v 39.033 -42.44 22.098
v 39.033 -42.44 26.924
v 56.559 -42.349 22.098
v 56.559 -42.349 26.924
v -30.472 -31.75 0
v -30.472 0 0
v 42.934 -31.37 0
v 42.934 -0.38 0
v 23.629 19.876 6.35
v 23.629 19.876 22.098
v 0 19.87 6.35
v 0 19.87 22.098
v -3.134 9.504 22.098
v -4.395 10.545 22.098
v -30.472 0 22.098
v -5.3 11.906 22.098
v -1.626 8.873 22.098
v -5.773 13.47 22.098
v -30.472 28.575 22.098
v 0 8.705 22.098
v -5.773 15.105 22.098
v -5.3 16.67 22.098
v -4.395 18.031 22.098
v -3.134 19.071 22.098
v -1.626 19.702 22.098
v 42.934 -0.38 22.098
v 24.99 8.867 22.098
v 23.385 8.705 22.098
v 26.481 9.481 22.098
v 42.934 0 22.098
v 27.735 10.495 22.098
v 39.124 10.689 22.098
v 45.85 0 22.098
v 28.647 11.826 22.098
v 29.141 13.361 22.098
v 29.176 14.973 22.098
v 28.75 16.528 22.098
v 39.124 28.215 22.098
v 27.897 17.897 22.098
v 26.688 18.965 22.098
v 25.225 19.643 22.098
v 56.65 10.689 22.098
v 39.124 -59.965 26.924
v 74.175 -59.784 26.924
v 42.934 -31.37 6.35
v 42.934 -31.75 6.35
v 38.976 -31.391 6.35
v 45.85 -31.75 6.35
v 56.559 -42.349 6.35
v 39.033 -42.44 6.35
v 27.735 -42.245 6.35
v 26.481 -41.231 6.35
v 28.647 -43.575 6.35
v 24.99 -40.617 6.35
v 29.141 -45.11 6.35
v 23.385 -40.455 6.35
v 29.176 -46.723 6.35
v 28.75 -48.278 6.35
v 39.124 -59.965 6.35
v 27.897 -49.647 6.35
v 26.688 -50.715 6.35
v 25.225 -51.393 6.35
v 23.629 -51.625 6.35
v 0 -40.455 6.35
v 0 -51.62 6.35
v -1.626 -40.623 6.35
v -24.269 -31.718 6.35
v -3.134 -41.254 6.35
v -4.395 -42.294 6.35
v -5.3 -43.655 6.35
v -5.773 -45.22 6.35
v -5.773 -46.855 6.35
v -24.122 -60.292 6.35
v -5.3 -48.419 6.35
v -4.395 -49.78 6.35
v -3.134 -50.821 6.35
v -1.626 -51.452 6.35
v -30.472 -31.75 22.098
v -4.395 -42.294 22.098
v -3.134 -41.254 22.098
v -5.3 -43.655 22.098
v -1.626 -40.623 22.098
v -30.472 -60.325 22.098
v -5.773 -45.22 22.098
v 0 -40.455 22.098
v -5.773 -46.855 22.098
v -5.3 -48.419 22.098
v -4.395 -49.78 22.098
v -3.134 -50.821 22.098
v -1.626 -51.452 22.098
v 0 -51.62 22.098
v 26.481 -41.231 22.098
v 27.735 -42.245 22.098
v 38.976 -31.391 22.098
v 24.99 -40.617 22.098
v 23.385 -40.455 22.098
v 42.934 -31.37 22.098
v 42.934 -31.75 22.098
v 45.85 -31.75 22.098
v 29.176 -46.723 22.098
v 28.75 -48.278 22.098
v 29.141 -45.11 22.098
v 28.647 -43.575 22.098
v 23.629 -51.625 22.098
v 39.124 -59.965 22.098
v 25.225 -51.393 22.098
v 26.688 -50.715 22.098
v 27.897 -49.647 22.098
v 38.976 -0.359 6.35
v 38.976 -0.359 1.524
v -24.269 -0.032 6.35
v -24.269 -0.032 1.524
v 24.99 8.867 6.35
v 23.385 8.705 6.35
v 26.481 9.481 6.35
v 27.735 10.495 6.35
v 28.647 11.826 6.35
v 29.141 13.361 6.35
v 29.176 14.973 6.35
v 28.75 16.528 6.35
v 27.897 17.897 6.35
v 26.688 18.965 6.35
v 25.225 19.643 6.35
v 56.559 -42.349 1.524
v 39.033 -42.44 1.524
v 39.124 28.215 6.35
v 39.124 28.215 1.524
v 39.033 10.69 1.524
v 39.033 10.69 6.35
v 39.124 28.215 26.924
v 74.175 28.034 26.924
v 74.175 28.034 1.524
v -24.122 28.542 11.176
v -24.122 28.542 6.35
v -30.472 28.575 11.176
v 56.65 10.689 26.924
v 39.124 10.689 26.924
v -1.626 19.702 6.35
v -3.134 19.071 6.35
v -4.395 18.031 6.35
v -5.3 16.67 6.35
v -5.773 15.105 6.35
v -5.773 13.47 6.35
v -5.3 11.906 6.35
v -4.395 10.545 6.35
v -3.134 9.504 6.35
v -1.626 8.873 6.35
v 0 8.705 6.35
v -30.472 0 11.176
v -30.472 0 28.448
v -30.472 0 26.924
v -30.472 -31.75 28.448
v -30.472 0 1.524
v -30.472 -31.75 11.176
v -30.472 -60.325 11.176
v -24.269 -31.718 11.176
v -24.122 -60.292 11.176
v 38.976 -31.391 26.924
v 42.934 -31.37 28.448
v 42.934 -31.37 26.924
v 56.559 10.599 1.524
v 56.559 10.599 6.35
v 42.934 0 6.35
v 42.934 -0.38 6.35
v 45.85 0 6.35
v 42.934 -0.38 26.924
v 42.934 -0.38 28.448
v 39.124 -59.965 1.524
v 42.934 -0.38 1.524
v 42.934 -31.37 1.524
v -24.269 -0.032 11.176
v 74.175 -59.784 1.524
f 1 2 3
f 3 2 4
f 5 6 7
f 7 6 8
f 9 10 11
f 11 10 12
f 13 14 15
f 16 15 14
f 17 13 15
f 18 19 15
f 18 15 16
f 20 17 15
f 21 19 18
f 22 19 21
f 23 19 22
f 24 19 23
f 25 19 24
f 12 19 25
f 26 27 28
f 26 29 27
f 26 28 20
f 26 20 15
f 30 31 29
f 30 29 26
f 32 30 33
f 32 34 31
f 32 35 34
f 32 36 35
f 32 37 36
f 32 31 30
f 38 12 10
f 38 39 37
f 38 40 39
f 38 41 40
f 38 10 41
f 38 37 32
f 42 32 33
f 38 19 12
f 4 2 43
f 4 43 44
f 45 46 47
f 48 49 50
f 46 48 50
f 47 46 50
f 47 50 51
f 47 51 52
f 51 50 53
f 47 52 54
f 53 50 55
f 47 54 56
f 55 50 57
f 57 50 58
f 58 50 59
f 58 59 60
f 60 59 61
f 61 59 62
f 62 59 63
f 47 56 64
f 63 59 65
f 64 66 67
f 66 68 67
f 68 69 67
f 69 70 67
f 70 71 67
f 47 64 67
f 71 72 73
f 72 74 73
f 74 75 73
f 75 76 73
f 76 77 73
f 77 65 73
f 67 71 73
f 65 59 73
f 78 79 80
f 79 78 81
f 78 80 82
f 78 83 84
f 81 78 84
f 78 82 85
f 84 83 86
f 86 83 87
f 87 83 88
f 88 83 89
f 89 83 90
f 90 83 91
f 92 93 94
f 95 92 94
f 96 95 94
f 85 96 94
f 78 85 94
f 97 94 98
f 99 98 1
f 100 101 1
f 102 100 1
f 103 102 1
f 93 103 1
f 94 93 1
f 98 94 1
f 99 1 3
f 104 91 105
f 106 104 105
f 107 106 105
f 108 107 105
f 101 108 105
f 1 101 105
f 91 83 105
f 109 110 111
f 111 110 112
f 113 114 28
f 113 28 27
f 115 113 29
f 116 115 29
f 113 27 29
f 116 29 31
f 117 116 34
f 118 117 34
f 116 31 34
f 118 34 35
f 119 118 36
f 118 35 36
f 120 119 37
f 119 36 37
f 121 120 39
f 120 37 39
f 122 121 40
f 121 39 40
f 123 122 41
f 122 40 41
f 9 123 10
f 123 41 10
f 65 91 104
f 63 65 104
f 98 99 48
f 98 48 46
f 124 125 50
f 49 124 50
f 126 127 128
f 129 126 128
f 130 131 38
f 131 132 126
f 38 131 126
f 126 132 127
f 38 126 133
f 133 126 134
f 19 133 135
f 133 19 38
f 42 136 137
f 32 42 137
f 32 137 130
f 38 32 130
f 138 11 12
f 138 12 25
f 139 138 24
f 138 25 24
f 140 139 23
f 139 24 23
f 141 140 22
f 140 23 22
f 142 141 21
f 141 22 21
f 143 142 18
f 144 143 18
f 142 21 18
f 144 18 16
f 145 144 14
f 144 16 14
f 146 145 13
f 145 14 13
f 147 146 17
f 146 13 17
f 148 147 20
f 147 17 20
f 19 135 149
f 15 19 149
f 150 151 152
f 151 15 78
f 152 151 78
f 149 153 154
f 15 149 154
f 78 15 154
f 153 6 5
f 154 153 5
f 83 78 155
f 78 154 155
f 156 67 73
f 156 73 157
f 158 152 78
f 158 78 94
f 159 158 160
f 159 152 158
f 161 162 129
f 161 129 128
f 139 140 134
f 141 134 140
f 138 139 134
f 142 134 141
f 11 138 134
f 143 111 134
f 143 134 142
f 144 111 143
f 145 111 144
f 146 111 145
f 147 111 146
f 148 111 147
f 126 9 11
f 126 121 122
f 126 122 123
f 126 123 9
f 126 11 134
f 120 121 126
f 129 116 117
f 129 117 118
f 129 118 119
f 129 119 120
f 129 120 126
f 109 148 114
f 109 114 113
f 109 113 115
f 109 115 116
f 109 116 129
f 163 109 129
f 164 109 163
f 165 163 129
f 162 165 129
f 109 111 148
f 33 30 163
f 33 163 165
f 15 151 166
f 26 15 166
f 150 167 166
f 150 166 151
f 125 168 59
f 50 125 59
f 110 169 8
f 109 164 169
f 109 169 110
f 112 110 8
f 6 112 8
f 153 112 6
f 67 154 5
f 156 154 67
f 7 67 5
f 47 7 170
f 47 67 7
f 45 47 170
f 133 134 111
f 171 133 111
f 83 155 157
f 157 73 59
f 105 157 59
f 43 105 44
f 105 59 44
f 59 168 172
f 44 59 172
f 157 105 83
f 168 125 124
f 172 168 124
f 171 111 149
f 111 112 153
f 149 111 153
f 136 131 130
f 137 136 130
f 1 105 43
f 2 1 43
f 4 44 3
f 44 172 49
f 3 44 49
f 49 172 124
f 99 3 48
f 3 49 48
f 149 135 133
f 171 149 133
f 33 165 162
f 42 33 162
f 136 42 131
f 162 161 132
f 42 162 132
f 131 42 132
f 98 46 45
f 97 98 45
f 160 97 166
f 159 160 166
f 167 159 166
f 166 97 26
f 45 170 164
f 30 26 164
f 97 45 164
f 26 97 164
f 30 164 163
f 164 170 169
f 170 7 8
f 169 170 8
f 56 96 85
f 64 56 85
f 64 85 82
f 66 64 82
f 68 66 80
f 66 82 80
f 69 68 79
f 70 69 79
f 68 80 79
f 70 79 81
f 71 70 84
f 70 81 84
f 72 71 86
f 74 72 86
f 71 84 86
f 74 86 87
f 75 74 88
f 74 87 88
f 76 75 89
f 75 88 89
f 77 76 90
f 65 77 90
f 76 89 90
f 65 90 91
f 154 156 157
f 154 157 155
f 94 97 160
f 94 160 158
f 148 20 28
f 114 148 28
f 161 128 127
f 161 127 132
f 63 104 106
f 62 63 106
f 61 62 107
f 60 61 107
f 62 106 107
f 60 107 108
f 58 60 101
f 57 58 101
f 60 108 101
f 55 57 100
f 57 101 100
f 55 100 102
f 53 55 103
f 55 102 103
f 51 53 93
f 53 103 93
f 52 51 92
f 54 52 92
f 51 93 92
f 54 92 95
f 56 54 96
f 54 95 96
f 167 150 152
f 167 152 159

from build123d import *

# Parameters (mm, degrees)
F0_W      = 73.406
F0_H      = 15.875
F1_DEPTH  = 28.448
F2_W      = 35.052
F2_H      = 1.524
F3_DEPTH  = 28.575
F4_W      = 69.596
F4_H      = 6.35
F5_DEPTH  = 28.575
F7_DEPTH  = 4.826
F9_DEPTH  = 28.575
F11_DEPTH = 4.826
F13_DEPTH = 9.652
F15_DEPTH = 4.826
F17_DEPTH = 25.4
F18_W     = 11.049
F18_H     = 4.826
F19_DEPTH = 25.4
F21_DEPTH = 25.4


with BuildPart() as f1:
    # F0 (on Top) → F1 (new body)
    with BuildSketch(Plane.XY):
        Polygon((74.175101427, 28.0341930517), (-30.4715011545, 28.575), (-30.4715011545, 0), (42.9344988455, 0), (45.8496453135, 0), align=None)
        with Locations((6.2314988455, -7.9375)):
            Rectangle(F0_W, F0_H)
        Polygon((42.9344988455, -15.875), (-30.4715011545, -15.875), (-30.4715011545, -31.75), (-30.4715011545, -60.325), (74.175101427, -59.7841930517), (45.8496453135, -31.75), (42.9344988455, -31.75), align=None)
    extrude(amount=F1_DEPTH)

    # F2 (on face) → F3 (cut)
    with BuildSketch(Plane(origin=(0.3109336175, -60.1659183461, 0), x_dir=(0.9999866465, 0.005167867, 0), z_dir=(0.005167867, -0.9999866465, 0))):
        with Locations((56.3391541689, 27.686)):
            Rectangle(F2_W, F2_H)
        with Locations((56.3391541689, 0.762)):
            Rectangle(F2_W, F2_H)
    extrude(amount=-F3_DEPTH, mode=Mode.SUBTRACT)

    # F4 (on face) → F5 (cut)
    with BuildSketch(Plane(origin=(0.3109336175, -60.1659183461, 0), x_dir=(0.9999866465, 0.005167867, 0), z_dir=(0.005167867, -0.9999866465, 0))):
        with Locations((4.0151541689, 25.273)):
            Rectangle(F4_W, F4_H)
        Polygon((-24.4328458311, 11.176), (-30.7828458311, 11.176), (-30.7828458311, 0), (38.8131541689, 0), (38.8131541689, 6.35), (-24.4328458311, 6.35), align=None)
    extrude(amount=-F5_DEPTH, mode=Mode.SUBTRACT)

    # F6 (on face) → F7 (cut)
    with BuildSketch(Plane.XY.offset(26.924)):
        Polygon((42.9344988455, -31.75), (38.9777544369, -31.75), (39.0329974569, -42.4395711603), (56.5587634232, -42.3489991228), (45.8496453135, -31.75), align=None)
        Polygon((42.9344988455, -31.3702609057), (38.9758976941, -31.3907187032), (38.9777544369, -31.75), (42.9344988455, -31.75), align=None)
    extrude(amount=-F7_DEPTH, mode=Mode.SUBTRACT)

    # F8 (on face) → F9 (cut)
    with BuildSketch(Plane(origin=(0.1468560305, 28.4167662886, 0), x_dir=(-0.9999866465, 0.005167867, 0), z_dir=(0.005167867, 0.9999866465, 0))):
        Polygon((-48.6415103078, 28.448), (-74.0292339469, 28.448), (-74.0292339469, 26.924), (-48.6415103078, 26.924), (30.6187660531, 26.924), (30.6187660531, 28.448), align=None)
        Polygon((30.6187660531, 1.524), (-74.0292339469, 1.524), (-74.0292339469, 0), (-49.0522161126, 0), (30.6187660531, 0), align=None)
    extrude(amount=-F9_DEPTH, mode=Mode.SUBTRACT)

    # F10 (on face) → F11 (cut)
    with BuildSketch(Plane.XY.offset(26.924)):
        Polygon((39.1235694943, 10.6893371266), (39.1235694943, 28.2153371266), (-30.4715011545, 28.575), (-30.4715011545, -0.0003815818), (42.9344988455, -0.3797390943), (42.9344988455, 0), (45.8496453135, 0), (56.6500399995, 10.6893371266), align=None)
    extrude(amount=-F11_DEPTH, mode=Mode.SUBTRACT)

    # F12 (on face) → F13 (cut)
    with BuildSketch(Plane(origin=(0, 0, 1.524), x_dir=(1, 0, 0), z_dir=(0, 0, -1))):
        Polygon((-30.4715011545, 0.0003815818), (-30.4715011545, -28.575), (-24.1215859493, -28.5421840444), (-24.2692577495, 0.0324343789), align=None)
    extrude(amount=-F13_DEPTH, mode=Mode.SUBTRACT)

    # F14 (on face) → F15 (cut)
    with BuildSketch(Plane(origin=(0, 0, 1.524), x_dir=(1, 0, 0), z_dir=(0, 0, -1))):
        Polygon((38.9758976941, 0.3592812968), (-24.2692577495, 0.0324343789), (-24.1215859493, -28.5421840444), (39.1235694943, -28.2153371266), align=None)
    extrude(amount=-F15_DEPTH, mode=Mode.SUBTRACT)

    # F16 (on face) → F17 (cut)
    with BuildSketch(Plane(origin=(38.9767134639, -0.201429162, 0), x_dir=(-0.005167867, -0.9999866465, 0), z_dir=(-0.9999866465, 0.005167867, 0))):
        Polygon((0.1578542427, 6.35), (-0.2124354796, 6.35), (-10.8911457573, 6.35), (-10.8911457573, 1.524), (-0.2124354796, 1.524), (0.1578542427, 1.524), align=None)
    extrude(amount=-F17_DEPTH, mode=Mode.SUBTRACT)

    # F18 (on face) → F19 (cut)
    with BuildSketch(Plane(origin=(38.8126358769, 0.2005812195, 0), x_dir=(0.005167867, -0.9999866465, 0), z_dir=(-0.9999866465, -0.005167867, 0))):
        with Locations((37.1162217833, 3.937)):
            Rectangle(F18_W, F18_H)
    extrude(amount=-F19_DEPTH, mode=Mode.SUBTRACT)

    # F20 (on face) → F21 (cut)
    with BuildSketch(Plane.XY.offset(22.098)):
        with BuildLine():
            Line((0, -51.6199137252), (23.6292229191, -51.6253090635))
            ThreePointArc((23.6292229191, -51.6253090635), (29.2171637927, -45.9151668007), (23.384997691, -40.454704693))
            Line((23.384997691, -40.454704693), (0, -40.454704693))
            ThreePointArc((0, -40.454704693), (-5.8335011545, -46.0373092091), (0, -51.6199137252))
        make_face()
        with BuildLine():
            ThreePointArc((0, 19.870295307), (-5.8335011545, 14.2876907909), (0, 8.7050862748))
            Line((0, 8.7050862748), (23.384997691, 8.7050862748))
            ThreePointArc((23.384997691, 8.7050862748), (29.2171637927, 14.1655483825), (23.6292229191, 19.8756906452))
            Line((23.6292229191, 19.8756906452), (0, 19.870295307))
        make_face()
    extrude(amount=-F21_DEPTH, mode=Mode.SUBTRACT)


solid = f1.part
